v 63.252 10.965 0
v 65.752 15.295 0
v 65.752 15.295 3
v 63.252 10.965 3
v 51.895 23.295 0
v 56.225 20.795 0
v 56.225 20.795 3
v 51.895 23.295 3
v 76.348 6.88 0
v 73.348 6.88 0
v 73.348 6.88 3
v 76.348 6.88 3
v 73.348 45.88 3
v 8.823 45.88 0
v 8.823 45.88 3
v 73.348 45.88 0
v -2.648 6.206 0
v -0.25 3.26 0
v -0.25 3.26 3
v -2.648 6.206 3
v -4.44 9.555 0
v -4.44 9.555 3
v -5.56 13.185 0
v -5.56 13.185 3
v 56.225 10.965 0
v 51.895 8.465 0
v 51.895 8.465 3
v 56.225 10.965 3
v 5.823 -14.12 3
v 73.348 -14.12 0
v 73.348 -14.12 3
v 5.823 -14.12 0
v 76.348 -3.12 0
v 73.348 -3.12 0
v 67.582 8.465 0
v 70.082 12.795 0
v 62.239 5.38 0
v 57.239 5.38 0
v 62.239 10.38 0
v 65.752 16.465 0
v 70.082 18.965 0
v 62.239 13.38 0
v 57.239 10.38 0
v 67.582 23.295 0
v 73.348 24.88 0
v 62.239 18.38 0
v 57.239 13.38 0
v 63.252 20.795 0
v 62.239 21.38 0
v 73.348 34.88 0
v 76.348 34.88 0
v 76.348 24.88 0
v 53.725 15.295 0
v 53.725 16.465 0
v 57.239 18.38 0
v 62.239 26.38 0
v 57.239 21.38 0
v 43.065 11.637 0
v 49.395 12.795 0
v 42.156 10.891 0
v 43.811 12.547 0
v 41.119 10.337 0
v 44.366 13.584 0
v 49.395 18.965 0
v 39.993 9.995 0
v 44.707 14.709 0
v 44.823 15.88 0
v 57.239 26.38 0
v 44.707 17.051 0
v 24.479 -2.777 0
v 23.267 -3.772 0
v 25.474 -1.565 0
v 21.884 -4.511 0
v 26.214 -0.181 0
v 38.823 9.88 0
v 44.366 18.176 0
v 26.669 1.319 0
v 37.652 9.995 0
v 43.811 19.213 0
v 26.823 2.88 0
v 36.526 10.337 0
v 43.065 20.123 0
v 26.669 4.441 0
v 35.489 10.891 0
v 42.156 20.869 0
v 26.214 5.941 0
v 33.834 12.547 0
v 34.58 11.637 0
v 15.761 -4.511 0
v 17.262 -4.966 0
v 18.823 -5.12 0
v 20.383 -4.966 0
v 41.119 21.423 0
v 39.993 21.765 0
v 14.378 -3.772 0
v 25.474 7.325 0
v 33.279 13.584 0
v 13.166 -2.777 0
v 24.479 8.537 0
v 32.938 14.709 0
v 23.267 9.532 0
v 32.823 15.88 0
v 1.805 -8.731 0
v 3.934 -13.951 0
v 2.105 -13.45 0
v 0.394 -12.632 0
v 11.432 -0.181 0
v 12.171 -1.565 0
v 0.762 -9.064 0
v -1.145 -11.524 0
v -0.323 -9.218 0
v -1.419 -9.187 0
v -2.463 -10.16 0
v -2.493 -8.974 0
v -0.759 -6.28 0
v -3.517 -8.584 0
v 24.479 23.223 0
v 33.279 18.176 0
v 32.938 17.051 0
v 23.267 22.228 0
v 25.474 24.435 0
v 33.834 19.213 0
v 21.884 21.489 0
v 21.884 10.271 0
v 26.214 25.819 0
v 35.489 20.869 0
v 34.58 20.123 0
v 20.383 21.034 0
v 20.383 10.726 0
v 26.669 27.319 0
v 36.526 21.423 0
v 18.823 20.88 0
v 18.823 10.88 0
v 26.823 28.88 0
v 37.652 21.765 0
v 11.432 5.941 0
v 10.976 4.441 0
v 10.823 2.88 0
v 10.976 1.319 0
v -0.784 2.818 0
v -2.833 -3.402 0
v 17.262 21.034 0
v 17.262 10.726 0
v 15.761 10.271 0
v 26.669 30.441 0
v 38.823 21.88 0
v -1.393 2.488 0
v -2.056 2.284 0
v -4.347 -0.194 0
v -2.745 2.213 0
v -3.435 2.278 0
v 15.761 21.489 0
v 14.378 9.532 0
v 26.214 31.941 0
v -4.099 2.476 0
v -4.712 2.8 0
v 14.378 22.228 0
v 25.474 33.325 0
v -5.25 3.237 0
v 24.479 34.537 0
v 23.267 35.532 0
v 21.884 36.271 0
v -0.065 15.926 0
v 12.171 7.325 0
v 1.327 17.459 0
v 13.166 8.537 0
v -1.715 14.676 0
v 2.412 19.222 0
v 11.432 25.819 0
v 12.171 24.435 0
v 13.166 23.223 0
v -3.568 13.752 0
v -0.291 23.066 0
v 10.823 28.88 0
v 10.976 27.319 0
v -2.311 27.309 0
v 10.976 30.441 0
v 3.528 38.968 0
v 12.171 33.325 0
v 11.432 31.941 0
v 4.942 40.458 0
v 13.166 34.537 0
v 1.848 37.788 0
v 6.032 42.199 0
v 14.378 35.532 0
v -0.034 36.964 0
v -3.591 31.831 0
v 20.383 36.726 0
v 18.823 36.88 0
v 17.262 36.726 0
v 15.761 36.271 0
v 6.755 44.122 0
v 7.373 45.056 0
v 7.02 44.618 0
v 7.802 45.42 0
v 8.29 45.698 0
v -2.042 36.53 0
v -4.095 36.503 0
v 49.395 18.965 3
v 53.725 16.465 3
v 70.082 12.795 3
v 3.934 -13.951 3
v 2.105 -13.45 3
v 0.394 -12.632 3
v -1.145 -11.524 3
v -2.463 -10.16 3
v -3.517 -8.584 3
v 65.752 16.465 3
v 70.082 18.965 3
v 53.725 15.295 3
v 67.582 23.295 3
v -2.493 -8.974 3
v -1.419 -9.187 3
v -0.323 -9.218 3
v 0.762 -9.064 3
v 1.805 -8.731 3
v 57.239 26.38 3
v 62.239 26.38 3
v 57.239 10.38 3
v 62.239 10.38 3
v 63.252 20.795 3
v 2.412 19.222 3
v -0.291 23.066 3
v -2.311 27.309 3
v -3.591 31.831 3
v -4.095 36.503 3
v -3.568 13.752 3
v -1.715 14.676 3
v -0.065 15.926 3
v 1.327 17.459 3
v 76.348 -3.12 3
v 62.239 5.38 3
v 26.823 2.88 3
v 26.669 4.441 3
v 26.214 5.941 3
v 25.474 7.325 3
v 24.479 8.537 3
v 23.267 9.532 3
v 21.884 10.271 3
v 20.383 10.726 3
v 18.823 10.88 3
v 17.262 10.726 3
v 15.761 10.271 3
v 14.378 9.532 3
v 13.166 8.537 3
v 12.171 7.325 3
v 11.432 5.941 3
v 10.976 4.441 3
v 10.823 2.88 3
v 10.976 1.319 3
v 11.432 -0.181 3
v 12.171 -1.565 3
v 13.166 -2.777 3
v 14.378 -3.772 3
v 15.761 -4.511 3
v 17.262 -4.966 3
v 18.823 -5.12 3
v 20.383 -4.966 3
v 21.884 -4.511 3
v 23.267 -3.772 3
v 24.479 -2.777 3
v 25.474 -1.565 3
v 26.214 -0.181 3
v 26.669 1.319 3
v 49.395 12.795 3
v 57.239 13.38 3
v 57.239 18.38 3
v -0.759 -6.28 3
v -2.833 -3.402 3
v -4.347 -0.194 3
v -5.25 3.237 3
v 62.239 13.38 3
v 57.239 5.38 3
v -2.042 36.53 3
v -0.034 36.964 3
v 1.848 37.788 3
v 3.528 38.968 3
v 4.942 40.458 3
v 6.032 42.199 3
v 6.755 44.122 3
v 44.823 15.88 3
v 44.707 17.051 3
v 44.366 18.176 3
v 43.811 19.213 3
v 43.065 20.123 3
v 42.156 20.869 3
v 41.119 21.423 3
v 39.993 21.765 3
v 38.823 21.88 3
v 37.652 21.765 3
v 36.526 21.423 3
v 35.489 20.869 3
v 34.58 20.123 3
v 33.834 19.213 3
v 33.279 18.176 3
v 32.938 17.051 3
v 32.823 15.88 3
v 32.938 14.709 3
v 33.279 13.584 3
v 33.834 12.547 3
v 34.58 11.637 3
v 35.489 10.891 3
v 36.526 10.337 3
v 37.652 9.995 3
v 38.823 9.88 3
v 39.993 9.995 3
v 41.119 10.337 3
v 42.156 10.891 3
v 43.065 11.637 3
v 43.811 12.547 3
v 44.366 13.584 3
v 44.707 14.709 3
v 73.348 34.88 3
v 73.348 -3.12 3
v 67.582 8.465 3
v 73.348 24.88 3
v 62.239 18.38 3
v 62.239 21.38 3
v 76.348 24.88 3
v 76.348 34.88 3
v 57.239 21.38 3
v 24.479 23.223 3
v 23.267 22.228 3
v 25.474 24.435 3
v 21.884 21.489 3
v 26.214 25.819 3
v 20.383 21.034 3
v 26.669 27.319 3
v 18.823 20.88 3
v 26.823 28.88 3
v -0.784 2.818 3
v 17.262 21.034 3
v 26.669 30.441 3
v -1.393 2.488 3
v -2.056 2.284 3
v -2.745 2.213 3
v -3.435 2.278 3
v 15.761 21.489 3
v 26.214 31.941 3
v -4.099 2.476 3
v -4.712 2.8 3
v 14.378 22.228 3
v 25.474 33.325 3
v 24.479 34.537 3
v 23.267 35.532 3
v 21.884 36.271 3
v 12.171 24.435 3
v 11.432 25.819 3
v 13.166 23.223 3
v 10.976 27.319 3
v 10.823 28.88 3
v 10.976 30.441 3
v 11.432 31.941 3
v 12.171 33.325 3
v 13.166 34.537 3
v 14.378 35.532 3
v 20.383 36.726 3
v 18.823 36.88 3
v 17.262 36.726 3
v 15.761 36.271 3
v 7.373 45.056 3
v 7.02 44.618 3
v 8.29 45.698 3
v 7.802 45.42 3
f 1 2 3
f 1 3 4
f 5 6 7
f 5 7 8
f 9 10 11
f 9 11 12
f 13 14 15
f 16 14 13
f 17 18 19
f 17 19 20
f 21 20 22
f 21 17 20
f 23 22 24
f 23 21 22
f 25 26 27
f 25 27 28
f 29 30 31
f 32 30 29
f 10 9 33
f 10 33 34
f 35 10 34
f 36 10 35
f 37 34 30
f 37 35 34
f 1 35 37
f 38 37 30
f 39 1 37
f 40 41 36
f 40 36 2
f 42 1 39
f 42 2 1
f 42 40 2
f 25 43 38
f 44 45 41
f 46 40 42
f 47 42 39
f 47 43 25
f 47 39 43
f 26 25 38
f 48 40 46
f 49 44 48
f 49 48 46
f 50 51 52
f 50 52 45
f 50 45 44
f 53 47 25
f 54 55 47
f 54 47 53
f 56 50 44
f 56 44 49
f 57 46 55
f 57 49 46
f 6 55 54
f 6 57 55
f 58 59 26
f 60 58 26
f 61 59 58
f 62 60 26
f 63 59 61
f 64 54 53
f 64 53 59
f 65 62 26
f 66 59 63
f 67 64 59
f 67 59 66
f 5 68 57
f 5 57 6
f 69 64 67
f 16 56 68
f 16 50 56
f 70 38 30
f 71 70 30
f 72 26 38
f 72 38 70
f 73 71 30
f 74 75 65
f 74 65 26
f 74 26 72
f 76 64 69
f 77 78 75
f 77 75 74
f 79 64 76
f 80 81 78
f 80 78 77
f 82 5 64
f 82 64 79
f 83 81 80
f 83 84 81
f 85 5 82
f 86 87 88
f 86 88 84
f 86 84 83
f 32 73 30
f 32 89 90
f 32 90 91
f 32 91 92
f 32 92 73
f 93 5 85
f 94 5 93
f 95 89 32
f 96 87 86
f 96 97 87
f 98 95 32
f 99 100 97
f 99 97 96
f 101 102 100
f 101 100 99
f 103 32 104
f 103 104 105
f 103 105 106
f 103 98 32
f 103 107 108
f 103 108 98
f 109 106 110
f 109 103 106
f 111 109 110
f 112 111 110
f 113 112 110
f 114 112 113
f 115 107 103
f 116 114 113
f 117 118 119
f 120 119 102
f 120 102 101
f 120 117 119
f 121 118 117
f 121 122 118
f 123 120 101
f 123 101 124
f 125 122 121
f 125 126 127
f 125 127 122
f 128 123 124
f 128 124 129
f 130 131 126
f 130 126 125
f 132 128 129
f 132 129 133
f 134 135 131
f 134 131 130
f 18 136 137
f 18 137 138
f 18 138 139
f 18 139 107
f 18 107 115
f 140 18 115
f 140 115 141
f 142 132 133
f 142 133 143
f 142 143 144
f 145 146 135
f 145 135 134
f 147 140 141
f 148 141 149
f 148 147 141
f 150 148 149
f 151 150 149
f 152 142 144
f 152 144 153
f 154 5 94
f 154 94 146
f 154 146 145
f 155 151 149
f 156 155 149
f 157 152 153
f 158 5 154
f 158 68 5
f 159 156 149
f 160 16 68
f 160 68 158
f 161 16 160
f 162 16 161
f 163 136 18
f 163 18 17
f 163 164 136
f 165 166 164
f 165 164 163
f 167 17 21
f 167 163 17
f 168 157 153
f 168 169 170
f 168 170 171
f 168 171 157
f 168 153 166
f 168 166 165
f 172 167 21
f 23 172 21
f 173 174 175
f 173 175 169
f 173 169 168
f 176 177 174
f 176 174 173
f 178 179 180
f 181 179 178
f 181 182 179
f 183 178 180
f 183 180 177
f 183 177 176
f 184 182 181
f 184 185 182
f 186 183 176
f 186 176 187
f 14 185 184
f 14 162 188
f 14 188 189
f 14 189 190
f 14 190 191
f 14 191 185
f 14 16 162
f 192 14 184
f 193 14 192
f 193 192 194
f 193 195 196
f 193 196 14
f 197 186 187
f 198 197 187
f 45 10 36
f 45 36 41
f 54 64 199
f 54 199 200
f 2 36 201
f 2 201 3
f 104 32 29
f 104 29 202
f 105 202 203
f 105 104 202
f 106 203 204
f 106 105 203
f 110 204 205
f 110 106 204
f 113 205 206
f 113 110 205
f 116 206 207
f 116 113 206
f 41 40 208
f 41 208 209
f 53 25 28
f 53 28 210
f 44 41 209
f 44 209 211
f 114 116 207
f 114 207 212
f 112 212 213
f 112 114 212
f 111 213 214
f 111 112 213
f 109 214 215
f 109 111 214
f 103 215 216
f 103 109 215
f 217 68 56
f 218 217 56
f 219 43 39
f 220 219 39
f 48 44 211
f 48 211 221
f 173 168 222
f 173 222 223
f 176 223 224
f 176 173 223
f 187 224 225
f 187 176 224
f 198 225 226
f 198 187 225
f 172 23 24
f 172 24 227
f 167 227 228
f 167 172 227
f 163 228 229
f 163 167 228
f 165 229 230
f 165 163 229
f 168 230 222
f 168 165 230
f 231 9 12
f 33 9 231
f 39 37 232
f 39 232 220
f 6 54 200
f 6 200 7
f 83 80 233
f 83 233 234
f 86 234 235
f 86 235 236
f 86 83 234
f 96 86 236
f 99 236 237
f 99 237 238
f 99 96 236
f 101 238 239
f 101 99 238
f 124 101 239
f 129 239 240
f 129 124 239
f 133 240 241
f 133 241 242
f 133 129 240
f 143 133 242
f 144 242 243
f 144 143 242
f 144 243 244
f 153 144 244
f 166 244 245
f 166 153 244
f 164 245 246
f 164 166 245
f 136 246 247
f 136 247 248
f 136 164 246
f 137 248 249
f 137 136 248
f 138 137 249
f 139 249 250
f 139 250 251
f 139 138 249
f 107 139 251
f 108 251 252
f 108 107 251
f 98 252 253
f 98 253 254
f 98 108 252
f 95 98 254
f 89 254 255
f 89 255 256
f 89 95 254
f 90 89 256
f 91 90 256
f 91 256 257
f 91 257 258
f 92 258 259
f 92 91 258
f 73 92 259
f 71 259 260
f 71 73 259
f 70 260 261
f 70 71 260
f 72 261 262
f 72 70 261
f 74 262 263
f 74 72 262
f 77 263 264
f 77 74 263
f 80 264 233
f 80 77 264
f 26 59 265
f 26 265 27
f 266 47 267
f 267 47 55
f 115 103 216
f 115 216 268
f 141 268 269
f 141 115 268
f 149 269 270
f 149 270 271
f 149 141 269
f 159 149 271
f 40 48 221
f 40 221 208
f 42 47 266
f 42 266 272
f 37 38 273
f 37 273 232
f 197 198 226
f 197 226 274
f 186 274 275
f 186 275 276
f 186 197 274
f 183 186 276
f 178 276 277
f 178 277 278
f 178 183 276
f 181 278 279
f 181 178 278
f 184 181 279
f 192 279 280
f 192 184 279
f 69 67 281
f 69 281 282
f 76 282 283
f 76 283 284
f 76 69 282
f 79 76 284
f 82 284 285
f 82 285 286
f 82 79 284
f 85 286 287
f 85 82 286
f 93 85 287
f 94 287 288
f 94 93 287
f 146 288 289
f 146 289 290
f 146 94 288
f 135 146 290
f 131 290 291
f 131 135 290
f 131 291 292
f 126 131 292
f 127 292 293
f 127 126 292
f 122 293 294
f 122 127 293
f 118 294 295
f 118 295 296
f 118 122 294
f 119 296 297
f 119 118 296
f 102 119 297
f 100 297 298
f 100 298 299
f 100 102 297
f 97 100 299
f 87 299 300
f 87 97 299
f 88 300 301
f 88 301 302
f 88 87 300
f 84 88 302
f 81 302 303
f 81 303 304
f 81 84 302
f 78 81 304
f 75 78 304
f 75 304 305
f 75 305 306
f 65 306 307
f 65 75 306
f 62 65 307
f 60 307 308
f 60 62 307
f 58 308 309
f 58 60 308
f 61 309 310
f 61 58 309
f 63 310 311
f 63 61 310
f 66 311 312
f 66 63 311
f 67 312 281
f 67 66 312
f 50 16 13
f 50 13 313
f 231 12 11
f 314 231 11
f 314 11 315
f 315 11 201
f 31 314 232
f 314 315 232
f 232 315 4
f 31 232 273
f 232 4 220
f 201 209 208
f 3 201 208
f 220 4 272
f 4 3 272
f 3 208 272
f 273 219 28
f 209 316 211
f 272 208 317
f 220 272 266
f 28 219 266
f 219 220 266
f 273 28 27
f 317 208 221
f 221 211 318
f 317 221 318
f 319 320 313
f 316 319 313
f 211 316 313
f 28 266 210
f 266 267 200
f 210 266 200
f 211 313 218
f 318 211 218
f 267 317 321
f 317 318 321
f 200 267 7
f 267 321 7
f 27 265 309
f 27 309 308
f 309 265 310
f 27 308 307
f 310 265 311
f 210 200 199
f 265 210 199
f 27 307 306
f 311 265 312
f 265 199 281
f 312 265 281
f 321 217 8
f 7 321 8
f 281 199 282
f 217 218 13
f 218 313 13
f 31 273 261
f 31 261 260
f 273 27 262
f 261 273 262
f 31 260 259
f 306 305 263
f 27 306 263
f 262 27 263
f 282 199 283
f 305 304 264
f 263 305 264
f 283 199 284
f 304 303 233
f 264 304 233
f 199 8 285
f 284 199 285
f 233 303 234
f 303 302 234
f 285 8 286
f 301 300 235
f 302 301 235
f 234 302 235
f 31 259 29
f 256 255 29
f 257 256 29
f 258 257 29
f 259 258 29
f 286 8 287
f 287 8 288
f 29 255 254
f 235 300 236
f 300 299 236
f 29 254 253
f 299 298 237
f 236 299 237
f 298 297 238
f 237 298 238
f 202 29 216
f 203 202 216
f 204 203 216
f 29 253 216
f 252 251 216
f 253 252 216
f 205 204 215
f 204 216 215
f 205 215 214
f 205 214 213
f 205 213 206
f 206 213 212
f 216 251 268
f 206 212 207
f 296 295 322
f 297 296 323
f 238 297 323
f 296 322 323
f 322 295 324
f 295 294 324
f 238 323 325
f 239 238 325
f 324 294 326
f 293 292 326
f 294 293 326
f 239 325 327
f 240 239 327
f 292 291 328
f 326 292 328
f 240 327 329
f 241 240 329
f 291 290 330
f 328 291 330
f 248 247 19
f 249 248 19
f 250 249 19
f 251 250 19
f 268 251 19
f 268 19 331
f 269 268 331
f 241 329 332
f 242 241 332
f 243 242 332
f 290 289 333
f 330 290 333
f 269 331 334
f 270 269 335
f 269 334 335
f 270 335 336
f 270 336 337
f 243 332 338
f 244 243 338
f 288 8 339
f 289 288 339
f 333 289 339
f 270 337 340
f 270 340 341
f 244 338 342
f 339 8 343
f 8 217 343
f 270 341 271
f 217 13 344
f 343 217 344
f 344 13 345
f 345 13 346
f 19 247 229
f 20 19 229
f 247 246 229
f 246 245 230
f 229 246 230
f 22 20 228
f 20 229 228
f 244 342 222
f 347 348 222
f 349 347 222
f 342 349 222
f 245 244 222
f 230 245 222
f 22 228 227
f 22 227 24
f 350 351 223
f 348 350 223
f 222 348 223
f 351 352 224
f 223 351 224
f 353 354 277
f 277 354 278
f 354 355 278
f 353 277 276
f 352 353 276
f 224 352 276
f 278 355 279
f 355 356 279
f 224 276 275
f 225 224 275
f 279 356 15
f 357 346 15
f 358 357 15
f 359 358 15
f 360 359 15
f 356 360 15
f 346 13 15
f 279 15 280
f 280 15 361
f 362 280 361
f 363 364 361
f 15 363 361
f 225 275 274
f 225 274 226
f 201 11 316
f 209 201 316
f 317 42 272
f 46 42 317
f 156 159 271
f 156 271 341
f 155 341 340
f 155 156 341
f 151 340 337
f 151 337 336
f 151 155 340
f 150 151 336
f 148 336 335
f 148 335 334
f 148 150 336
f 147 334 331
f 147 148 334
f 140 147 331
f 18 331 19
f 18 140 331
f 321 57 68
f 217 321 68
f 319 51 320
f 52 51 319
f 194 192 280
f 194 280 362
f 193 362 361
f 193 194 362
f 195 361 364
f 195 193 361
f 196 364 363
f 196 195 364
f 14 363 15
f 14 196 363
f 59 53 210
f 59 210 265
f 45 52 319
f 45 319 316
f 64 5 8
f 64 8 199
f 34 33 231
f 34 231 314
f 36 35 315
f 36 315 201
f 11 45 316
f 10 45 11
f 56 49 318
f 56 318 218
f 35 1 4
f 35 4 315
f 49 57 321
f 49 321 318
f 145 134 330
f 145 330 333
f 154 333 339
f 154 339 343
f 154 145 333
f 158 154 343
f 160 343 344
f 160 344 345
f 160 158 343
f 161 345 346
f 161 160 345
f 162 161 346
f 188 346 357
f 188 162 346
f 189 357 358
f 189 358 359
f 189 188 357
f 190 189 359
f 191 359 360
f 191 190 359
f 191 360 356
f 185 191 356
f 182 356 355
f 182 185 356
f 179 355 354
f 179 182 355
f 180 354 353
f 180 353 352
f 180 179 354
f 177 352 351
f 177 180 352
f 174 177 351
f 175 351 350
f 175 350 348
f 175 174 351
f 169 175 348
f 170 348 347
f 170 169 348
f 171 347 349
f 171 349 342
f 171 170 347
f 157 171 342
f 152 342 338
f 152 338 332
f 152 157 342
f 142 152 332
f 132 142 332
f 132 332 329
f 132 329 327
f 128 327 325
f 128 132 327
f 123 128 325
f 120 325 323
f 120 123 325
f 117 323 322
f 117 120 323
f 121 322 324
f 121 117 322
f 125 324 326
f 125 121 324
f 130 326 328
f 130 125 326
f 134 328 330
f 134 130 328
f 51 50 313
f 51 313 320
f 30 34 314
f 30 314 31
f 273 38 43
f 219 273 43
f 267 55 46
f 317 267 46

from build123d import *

# Parameters (mm, degrees)
MODEL_R                 = 8
MODEL_R_2               = 6
MODEL_W                 = 5
MODEL_H                 = 5
SALIENTE_EXTRUIR1_DEPTH = 3


with BuildPart() as part:
    # Model → Saliente-Extruir1 (new body)
    with BuildSketch(Plane.XY):
        with BuildLine():
            Line((76.347655659, 34.880000028), (76.347655659, 24.880000028))
            Line((76.347655659, 24.880000028), (73.347655659, 24.880000028))
            Line((73.347655659, 24.880000028), (73.347655659, 6.880000028))
            Line((73.347655659, 6.880000028), (76.347655659, 6.880000028))
            Line((76.347655659, 6.880000028), (76.347655659, -3.119999972))
            Line((76.347655659, -3.119999972), (73.347655659, -3.119999972))
            Line((73.347655659, -3.119999972), (73.347655659, -14.119999972))
            Line((73.347655659, -14.119999972), (61.82755788, -14.119999972))
            Line((61.82755788, -14.119999972), (5.822580598, -14.119999972))
            ThreePointArc((5.822580598, -14.119999972), (0.393738877, -12.632215144), (-3.517289733, -8.583798005))
            ThreePointArc((-3.517289733, -8.583798005), (-0.871613495, -9.225522901), (1.80545298, -8.730822292))
            ThreePointArc((1.80545298, -8.730822292), (-2.833232138, -3.402025371), (-5.249801899, 3.236774734))
            ThreePointArc((-5.249801899, 3.236774734), (-2.74505386, 2.21277877), (-0.249855047, 3.259828604))
            ThreePointArc((-0.249855047, 3.259828604), (-3.624986156, 7.837335992), (-5.559793418, 13.185382809))
            ThreePointArc((-5.559793418, 13.185382809), (-0.86111803, 15.262797511), (2.412456901, 19.222205222))
            ThreePointArc((2.412456901, 19.222205222), (-2.310766872, 27.309140745), (-4.095322699, 36.502765137))
            ThreePointArc((-4.095322699, 36.502765137), (2.717491313, 38.336145621), (6.755388207, 44.121567597))
            ThreePointArc((6.755388207, 44.121567597), (7.57877424, 45.247904396), (8.822580598, 45.880000028))
            Line((8.822580598, 45.880000028), (11.313037594, 45.880000028))
            Line((11.313037594, 45.880000028), (73.347655659, 45.880000028))
            Line((73.347655659, 45.880000028), (73.347655659, 34.880000028))
            Line((73.347655659, 34.880000028), (76.347655659, 34.880000028))
        make_face()
        with Locations((18.822580598, 28.880000028)):
            Circle(MODEL_R, mode=Mode.SUBTRACT)
        with Locations((38.822580598, 15.880000028)):
            Circle(MODEL_R_2, mode=Mode.SUBTRACT)
        with Locations((18.822580598, 2.880000028)):
            Circle(MODEL_R, mode=Mode.SUBTRACT)
        Polygon((53.725434944, 16.464936518), (56.225434944, 20.795063537), (51.895307925, 23.295063537), (49.395307925, 18.964936518), align=None, mode=Mode.SUBTRACT)
        Polygon((49.395307925, 12.795063537), (51.895307925, 8.464936518), (56.225434944, 10.964936518), (53.725434944, 15.295063537), align=None, mode=Mode.SUBTRACT)
        with Locations((59.738574665, 23.880000028)):
            Rectangle(MODEL_W, MODEL_H, mode=Mode.SUBTRACT)
        Polygon((65.751714386, 15.295063537), (63.251714386, 10.964936518), (67.581841405, 8.464936518), (70.081841405, 12.795063537), align=None, mode=Mode.SUBTRACT)
        Polygon((70.081841405, 18.964936518), (67.581841405, 23.295063537), (63.251714386, 20.795063537), (65.751714386, 16.464936518), align=None, mode=Mode.SUBTRACT)
        with Locations((59.738574665, 7.880000028)):
            Rectangle(MODEL_W, MODEL_H, mode=Mode.SUBTRACT)
        with Locations((59.738574665, 15.880000028)):
            Rectangle(MODEL_W, MODEL_H, mode=Mode.SUBTRACT)
    extrude(amount=SALIENTE_EXTRUIR1_DEPTH)


solid = part.part
